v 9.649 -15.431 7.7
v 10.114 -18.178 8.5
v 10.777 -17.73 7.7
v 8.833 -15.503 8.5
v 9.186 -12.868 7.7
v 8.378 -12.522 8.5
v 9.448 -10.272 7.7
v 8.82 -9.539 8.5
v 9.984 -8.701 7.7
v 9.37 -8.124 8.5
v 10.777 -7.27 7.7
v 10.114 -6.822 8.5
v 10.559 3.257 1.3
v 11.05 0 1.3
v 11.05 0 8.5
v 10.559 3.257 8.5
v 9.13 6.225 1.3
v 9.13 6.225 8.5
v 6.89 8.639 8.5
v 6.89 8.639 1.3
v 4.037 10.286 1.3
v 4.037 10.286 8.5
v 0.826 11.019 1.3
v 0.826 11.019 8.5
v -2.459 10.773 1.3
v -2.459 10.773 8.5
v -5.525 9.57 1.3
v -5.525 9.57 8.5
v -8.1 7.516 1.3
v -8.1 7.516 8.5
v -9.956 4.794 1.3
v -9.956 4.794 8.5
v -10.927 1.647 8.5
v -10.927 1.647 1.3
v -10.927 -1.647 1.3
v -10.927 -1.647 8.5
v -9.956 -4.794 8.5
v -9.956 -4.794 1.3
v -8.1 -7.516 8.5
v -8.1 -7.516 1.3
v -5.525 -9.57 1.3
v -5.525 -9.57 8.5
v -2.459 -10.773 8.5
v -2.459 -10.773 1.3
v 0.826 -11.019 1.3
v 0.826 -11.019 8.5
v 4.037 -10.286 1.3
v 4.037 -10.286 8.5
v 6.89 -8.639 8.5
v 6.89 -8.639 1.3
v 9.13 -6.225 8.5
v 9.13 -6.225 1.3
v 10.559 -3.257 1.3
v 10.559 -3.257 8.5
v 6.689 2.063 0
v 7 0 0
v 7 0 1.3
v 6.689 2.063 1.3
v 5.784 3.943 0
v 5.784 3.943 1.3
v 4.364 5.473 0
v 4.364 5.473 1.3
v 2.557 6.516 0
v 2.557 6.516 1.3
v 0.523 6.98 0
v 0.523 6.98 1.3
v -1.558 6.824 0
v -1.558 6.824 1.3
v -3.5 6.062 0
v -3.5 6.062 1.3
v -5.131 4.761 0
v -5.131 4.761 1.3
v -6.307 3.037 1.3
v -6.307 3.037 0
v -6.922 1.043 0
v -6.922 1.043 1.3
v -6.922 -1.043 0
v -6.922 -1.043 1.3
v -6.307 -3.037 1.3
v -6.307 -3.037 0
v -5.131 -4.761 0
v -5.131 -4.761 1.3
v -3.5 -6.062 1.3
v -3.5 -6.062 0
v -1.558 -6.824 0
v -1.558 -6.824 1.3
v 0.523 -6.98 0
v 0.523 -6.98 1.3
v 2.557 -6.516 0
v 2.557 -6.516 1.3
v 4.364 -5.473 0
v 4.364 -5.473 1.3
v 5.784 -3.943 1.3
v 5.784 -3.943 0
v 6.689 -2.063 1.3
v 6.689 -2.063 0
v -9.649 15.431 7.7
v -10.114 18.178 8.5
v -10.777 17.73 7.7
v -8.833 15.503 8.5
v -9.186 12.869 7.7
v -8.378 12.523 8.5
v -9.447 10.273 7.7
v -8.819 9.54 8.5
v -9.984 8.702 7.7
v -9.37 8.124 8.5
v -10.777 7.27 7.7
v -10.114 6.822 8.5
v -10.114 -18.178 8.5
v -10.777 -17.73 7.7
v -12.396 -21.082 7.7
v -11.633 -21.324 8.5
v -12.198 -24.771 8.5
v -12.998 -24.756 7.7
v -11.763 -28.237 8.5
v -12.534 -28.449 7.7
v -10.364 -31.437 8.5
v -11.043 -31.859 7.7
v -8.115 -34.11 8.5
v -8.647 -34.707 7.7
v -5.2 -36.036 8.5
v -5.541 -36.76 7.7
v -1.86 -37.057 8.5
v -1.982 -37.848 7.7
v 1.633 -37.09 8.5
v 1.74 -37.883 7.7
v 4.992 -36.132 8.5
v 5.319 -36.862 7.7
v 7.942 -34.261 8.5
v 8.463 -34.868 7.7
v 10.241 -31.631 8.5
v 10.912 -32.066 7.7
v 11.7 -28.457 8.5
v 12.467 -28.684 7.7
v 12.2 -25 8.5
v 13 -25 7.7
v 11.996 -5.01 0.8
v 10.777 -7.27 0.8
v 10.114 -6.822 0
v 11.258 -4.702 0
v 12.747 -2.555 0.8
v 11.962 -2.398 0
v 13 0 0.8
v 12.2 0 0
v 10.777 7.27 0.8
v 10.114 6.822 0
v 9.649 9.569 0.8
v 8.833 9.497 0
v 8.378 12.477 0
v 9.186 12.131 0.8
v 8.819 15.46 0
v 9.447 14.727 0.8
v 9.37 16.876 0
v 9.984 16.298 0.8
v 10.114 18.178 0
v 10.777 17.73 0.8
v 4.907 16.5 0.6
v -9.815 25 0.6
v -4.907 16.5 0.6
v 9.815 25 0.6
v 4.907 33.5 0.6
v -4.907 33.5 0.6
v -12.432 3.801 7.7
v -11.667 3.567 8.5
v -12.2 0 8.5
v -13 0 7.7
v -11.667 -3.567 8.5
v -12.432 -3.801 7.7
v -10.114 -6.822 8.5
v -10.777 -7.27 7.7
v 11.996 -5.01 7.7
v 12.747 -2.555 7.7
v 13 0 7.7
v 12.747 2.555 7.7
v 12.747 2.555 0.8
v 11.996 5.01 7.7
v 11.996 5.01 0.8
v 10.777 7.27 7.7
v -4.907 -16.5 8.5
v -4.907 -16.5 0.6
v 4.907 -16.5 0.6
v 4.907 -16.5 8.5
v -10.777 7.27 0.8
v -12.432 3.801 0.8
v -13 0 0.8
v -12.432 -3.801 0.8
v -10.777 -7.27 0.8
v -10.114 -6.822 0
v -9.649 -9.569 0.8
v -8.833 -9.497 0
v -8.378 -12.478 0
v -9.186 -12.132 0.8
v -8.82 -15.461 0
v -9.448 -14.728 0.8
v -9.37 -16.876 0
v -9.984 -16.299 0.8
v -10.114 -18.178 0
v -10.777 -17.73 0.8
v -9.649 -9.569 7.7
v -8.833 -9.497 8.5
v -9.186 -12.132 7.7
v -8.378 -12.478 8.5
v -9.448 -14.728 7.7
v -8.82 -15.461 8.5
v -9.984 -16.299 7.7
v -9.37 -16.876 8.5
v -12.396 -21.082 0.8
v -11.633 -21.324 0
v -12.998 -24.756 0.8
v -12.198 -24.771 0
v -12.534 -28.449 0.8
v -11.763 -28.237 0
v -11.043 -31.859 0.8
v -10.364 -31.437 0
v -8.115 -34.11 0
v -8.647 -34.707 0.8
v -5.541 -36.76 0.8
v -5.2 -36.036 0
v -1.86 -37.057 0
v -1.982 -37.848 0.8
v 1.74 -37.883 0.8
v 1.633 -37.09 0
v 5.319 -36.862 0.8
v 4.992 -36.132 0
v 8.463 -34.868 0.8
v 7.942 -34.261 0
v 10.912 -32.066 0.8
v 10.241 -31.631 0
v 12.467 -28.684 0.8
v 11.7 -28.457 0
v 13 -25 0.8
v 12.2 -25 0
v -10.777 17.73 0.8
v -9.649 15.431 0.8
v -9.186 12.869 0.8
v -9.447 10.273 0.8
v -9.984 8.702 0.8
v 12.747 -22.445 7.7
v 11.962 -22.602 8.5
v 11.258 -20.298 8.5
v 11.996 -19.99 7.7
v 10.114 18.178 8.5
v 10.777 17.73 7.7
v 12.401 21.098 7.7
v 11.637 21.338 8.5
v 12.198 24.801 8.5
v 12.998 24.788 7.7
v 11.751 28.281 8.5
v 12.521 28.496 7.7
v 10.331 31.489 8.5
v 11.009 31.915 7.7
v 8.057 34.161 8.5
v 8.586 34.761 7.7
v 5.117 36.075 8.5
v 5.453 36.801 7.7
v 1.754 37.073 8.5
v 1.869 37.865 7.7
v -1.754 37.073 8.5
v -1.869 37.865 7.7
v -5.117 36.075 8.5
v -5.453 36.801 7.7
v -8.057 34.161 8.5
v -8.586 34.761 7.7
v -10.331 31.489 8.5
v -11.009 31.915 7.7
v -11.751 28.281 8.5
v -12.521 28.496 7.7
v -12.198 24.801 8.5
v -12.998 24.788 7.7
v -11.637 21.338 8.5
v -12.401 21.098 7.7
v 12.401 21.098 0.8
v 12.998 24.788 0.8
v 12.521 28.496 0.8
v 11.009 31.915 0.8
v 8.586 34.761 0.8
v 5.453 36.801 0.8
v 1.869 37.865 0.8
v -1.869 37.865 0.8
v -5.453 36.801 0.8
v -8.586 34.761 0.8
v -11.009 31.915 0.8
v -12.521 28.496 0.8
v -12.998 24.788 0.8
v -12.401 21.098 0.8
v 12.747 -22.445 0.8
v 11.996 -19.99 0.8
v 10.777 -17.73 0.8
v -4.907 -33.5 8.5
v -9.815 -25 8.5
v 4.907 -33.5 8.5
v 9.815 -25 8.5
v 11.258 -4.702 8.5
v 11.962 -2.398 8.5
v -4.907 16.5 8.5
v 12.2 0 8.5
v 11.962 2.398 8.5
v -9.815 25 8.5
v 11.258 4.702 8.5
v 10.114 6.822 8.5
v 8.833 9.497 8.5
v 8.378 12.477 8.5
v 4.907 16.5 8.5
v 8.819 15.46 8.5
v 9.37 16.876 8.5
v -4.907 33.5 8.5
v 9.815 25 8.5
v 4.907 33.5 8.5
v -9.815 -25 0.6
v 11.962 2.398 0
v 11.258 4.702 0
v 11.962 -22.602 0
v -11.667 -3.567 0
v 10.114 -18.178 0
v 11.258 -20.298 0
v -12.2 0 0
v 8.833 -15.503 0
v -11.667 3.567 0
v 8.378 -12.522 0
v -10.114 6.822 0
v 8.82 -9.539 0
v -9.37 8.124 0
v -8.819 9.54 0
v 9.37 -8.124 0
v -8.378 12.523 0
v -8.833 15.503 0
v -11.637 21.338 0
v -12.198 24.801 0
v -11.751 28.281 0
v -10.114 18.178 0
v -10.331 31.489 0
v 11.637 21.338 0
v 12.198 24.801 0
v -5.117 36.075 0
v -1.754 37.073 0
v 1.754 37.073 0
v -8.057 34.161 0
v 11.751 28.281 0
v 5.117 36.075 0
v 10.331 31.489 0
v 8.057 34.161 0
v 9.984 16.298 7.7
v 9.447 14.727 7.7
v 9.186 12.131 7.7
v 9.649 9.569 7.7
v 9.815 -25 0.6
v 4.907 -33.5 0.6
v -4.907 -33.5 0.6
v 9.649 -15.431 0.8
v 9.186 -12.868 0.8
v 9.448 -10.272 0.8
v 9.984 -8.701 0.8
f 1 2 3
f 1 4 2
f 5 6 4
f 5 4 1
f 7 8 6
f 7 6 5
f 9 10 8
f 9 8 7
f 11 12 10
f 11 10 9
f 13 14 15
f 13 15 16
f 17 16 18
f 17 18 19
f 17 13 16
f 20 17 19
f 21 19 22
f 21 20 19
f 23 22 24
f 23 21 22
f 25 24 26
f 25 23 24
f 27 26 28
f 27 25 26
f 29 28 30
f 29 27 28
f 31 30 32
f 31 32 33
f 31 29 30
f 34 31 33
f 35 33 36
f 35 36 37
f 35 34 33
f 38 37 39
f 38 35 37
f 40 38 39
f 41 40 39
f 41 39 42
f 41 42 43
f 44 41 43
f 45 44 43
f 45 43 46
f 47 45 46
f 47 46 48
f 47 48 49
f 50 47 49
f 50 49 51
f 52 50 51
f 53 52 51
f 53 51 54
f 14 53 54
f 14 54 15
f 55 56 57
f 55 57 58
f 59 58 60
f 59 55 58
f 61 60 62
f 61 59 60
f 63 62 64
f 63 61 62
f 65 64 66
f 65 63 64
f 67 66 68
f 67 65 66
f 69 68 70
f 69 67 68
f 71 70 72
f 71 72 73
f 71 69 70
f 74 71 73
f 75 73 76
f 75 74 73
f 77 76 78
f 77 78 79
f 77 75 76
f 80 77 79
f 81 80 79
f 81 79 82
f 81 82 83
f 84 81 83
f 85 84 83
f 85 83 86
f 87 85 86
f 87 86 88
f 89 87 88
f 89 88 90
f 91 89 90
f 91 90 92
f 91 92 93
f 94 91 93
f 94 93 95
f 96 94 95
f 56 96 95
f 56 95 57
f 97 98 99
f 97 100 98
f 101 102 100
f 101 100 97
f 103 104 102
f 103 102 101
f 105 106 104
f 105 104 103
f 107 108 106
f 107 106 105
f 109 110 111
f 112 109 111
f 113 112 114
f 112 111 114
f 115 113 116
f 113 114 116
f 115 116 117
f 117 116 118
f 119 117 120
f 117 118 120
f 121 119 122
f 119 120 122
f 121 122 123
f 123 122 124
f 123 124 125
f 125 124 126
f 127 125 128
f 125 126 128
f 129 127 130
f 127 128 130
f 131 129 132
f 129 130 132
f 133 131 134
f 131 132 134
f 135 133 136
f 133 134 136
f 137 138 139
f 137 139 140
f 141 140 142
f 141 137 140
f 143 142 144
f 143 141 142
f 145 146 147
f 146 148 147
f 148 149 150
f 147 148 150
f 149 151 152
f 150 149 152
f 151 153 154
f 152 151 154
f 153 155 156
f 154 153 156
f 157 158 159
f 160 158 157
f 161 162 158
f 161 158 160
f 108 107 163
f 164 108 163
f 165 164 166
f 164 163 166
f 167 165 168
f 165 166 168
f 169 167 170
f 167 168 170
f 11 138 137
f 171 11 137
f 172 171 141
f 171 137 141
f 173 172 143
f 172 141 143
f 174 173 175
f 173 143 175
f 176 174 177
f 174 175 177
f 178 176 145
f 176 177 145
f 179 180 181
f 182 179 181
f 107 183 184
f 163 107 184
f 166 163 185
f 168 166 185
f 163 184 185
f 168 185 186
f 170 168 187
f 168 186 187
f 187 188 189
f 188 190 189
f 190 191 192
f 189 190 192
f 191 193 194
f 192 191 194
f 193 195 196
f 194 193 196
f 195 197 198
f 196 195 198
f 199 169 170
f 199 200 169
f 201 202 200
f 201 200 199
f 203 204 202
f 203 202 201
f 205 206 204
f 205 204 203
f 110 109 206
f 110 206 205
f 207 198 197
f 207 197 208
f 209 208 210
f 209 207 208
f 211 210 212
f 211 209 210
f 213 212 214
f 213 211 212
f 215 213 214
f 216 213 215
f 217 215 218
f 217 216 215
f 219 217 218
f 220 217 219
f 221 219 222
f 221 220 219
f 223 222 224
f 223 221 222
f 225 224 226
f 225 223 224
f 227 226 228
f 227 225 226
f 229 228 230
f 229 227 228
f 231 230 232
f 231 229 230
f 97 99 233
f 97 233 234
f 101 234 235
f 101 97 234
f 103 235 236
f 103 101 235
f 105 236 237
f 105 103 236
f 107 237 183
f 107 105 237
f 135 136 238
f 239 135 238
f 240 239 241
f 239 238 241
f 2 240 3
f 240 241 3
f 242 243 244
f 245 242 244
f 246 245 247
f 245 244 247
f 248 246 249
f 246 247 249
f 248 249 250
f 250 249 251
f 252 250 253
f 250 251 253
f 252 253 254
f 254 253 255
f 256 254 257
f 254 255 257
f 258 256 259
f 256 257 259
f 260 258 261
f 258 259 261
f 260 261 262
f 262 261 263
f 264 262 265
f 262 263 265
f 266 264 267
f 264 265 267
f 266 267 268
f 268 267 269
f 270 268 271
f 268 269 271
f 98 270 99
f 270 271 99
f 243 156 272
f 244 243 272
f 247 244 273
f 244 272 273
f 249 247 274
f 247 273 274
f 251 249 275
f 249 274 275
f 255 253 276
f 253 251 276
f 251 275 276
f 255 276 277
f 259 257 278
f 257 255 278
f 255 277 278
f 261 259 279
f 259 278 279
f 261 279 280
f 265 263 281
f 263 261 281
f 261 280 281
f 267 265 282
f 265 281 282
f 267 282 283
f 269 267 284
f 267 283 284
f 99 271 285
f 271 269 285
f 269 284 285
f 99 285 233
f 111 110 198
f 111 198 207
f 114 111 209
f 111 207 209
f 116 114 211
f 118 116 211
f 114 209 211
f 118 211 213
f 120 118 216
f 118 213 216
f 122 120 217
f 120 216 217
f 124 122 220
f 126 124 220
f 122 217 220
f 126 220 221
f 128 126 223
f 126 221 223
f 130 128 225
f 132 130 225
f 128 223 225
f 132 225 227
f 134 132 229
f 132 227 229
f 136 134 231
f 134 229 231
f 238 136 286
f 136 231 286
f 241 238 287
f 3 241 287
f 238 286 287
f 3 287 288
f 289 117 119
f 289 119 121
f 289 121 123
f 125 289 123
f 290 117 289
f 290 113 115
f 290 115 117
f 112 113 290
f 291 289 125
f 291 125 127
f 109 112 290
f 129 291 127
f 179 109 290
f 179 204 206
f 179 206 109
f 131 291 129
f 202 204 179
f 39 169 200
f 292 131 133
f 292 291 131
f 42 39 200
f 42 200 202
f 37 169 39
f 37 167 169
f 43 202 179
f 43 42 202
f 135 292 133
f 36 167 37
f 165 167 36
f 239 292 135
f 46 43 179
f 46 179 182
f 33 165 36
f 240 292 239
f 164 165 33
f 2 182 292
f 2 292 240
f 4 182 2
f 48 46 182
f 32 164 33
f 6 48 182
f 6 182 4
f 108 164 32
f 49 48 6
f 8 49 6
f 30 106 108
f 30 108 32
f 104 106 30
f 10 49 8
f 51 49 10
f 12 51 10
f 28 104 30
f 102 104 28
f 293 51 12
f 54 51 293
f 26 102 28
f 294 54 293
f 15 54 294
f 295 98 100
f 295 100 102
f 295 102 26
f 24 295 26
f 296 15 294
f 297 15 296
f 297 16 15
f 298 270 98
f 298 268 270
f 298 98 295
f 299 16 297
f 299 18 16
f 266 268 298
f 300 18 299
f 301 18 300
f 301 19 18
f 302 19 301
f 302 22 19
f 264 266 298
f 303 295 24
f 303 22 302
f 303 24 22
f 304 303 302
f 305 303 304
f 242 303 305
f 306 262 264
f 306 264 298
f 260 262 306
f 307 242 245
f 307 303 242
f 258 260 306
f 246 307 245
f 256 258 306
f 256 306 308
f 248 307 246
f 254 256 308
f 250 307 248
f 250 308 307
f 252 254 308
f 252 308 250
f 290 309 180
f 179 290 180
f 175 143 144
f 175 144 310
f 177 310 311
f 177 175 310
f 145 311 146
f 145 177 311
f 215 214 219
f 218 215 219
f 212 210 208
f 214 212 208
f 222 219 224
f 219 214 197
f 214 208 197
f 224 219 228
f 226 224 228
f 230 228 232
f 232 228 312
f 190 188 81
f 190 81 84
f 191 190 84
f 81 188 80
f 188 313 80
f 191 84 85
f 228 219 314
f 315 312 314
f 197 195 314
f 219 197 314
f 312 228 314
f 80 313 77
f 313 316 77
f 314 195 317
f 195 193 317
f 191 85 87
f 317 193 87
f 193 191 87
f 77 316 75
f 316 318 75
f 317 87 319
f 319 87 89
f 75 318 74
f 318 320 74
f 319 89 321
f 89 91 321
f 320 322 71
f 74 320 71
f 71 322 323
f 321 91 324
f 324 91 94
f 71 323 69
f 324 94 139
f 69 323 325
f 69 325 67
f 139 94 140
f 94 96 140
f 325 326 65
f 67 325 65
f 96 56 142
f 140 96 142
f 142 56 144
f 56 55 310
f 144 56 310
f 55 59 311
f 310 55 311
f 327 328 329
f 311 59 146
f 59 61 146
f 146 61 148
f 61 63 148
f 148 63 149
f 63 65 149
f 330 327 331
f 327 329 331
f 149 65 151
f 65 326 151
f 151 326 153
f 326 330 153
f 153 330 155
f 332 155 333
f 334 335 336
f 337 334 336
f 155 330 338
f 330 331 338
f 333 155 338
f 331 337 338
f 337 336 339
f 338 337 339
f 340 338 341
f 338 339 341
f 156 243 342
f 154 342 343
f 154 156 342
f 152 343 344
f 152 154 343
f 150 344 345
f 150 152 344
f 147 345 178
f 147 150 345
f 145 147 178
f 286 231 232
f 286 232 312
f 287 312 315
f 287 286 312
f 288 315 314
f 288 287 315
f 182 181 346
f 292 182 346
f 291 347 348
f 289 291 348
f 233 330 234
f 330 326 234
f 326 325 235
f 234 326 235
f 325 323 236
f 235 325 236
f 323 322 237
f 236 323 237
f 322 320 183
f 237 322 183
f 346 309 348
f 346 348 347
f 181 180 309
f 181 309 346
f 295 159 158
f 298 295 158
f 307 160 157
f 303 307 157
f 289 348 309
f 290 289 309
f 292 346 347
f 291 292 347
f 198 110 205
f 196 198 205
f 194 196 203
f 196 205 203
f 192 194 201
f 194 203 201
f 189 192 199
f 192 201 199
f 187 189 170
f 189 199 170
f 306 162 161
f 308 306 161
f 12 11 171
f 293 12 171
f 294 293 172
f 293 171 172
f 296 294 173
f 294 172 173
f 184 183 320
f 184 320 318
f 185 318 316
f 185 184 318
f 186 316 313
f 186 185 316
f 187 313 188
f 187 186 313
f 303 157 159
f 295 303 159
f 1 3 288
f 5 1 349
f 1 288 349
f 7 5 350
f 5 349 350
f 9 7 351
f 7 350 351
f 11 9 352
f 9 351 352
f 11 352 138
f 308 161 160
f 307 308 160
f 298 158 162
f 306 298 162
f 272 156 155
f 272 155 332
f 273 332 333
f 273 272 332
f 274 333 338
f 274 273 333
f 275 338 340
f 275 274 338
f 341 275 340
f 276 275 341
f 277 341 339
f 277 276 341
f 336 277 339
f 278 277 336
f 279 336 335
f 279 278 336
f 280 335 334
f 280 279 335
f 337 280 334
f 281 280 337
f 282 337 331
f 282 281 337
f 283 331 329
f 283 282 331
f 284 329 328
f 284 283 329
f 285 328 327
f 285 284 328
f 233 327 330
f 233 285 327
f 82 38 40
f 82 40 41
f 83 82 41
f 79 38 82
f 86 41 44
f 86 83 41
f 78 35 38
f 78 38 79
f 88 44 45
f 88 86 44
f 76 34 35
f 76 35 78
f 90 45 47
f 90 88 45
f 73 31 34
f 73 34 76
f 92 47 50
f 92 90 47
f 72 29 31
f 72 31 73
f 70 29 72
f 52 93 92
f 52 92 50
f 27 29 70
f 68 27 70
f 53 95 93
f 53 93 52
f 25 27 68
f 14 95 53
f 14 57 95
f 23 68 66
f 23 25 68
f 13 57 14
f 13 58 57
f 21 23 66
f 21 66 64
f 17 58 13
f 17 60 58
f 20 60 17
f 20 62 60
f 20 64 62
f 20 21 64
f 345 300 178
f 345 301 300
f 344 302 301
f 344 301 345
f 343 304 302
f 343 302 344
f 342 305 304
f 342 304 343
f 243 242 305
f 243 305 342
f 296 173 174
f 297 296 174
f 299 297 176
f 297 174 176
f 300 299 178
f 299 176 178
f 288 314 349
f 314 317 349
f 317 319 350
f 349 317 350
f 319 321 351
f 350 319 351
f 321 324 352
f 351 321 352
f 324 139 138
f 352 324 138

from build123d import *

# Parameters (mm, degrees)
F0_R     = 11.05
F0_R_2   = 7
F1_DEPTH = 0.6
F2_DEPTH = 8.5
F3_R     = 9.3534805389
F4_SIZE  = 0.8
F5_DEPTH = 1.3


with BuildPart() as f1:
    # F0 (on Top) → F1 (new body)
    with BuildSketch(Plane.XY):
        with BuildLine():
            ThreePointArc((-3.5707142143, 12.5), (0, 13), (3.5707142143, 12.5))
            ThreePointArc((3.5707142143, 12.5), (10.3783256064, 17.1711841504), (13, 25))
            ThreePointArc((13, 25), (-7.8288158496, 35.3783256064), (-3.5707142143, 12.5))
        make_face()
        Polygon((4.9074772881, 33.5), (9.8149545762, 25), (4.9074772881, 16.5), (-4.9074772881, 16.5), (-9.8149545762, 25), (-4.9074772881, 33.5), align=None, mode=Mode.SUBTRACT)
        with BuildLine():
            ThreePointArc((13, -25), (10.3783256064, -17.1711841504), (3.5707142143, -12.5))
            ThreePointArc((3.5707142143, -12.5), (0, -13), (-3.5707142143, -12.5))
            ThreePointArc((-3.5707142143, -12.5), (-7.8288158496, -35.3783256064), (13, -25))
        make_face()
        Polygon((-9.8149545762, -25), (-4.9074772881, -16.5), (4.9074772881, -16.5), (9.8149545762, -25), (4.9074772881, -33.5), (-4.9074772881, -33.5), align=None, mode=Mode.SUBTRACT)
        with BuildLine():
            ThreePointArc((3.5707142143, -12.5), (10.3783256064, -7.8288158496), (13, 0))
            ThreePointArc((13, 0), (10.3783256064, 7.8288158496), (3.5707142143, 12.5))
            ThreePointArc((3.5707142143, 12.5), (0, 12), (-3.5707142143, 12.5))
            ThreePointArc((-3.5707142143, 12.5), (-13, 0), (-3.5707142143, -12.5))
            ThreePointArc((-3.5707142143, -12.5), (0, -12), (3.5707142143, -12.5))
        make_face()
        Circle(F0_R, mode=Mode.SUBTRACT)
        Circle(F0_R)
        Circle(F0_R_2, mode=Mode.SUBTRACT)
        Polygon((4.9074772881, 16.5), (9.8149545762, 25), (4.9074772881, 33.5), (-4.9074772881, 33.5), (-9.8149545762, 25), (-4.9074772881, 16.5), align=None)
        Polygon((4.9074772881, -16.5), (-4.9074772881, -16.5), (-9.8149545762, -25), (-4.9074772881, -33.5), (4.9074772881, -33.5), (9.8149545762, -25), align=None)
        with BuildLine():
            ThreePointArc((-3.5707142143, 12.5), (0, 12), (3.5707142143, 12.5))
            ThreePointArc((3.5707142143, 12.5), (0, 13), (-3.5707142143, 12.5))
        make_face()
        with BuildLine():
            ThreePointArc((-3.5707142143, -12.5), (0, -13), (3.5707142143, -12.5))
            ThreePointArc((3.5707142143, -12.5), (0, -12), (-3.5707142143, -12.5))
        make_face()
    extrude(amount=F1_DEPTH)

    # F0 (on Top) → F2 (join)
    with BuildSketch(Plane.XY):
        with BuildLine():
            ThreePointArc((-3.5707142143, 12.5), (0, 13), (3.5707142143, 12.5))
            ThreePointArc((3.5707142143, 12.5), (10.3783256064, 17.1711841504), (13, 25))
            ThreePointArc((13, 25), (-7.8288158496, 35.3783256064), (-3.5707142143, 12.5))
        make_face()
        Polygon((4.9074772881, 33.5), (9.8149545762, 25), (4.9074772881, 16.5), (-4.9074772881, 16.5), (-9.8149545762, 25), (-4.9074772881, 33.5), align=None, mode=Mode.SUBTRACT)
        with BuildLine():
            ThreePointArc((3.5707142143, -12.5), (10.3783256064, -7.8288158496), (13, 0))
            ThreePointArc((13, 0), (10.3783256064, 7.8288158496), (3.5707142143, 12.5))
            ThreePointArc((3.5707142143, 12.5), (0, 12), (-3.5707142143, 12.5))
            ThreePointArc((-3.5707142143, 12.5), (-13, 0), (-3.5707142143, -12.5))
            ThreePointArc((-3.5707142143, -12.5), (0, -12), (3.5707142143, -12.5))
        make_face()
        Circle(F0_R, mode=Mode.SUBTRACT)
        with BuildLine():
            ThreePointArc((-3.5707142143, 12.5), (0, 12), (3.5707142143, 12.5))
            ThreePointArc((3.5707142143, 12.5), (0, 13), (-3.5707142143, 12.5))
        make_face()
        with BuildLine():
            ThreePointArc((-3.5707142143, -12.5), (0, -13), (3.5707142143, -12.5))
            ThreePointArc((3.5707142143, -12.5), (0, -12), (-3.5707142143, -12.5))
        make_face()
        with BuildLine():
            ThreePointArc((13, -25), (10.3783256064, -17.1711841504), (3.5707142143, -12.5))
            ThreePointArc((3.5707142143, -12.5), (0, -13), (-3.5707142143, -12.5))
            ThreePointArc((-3.5707142143, -12.5), (-7.8288158496, -35.3783256064), (13, -25))
        make_face()
        Polygon((-9.8149545762, -25), (-4.9074772881, -16.5), (4.9074772881, -16.5), (9.8149545762, -25), (4.9074772881, -33.5), (-4.9074772881, -33.5), align=None, mode=Mode.SUBTRACT)
    extrude(amount=F2_DEPTH)

    # F3
    f3_edges = [f1.edges().sort_by_distance(p)[0] for p in [
        (3.570714, -12.5, 4.25),
        (3.570714, 12.5, 4.25),
        (-3.570714, 12.5, 4.25),
        (-3.570714, -12.5, 4.25),
    ]]
    fillet(f3_edges, radius=F3_R)

    # F4
    f4_edges = [f1.edges().sort_by_distance(p)[0] for p in [
        (0, -38, 8.5),
        (9.178332, -12.5, 8.5),
        (13, 0, 8.5),
        (9.178332, 12.5, 8.5),
        (0, 38, 8.5),
        (-9.178332, 12.5, 8.5),
        (-13, 0, 8.5),
        (-9.178332, -12.5, 8.5),
        (0, -38, 0),
        (-9.178332, -12.5, 0),
        (-13, 0, 0),
        (-9.178332, 12.5, 0),
        (0, 38, 0),
        (9.178332, 12.5, 0),
        (13, 0, 0),
        (9.178332, -12.5, 0),
    ]]
    chamfer(f4_edges, length=F4_SIZE)

    # F0 (on Top) → F5 (join)
    with BuildSketch(Plane.XY):
        Circle(F0_R)
        Circle(F0_R_2, mode=Mode.SUBTRACT)
    extrude(amount=F5_DEPTH)


solid = f1.part
